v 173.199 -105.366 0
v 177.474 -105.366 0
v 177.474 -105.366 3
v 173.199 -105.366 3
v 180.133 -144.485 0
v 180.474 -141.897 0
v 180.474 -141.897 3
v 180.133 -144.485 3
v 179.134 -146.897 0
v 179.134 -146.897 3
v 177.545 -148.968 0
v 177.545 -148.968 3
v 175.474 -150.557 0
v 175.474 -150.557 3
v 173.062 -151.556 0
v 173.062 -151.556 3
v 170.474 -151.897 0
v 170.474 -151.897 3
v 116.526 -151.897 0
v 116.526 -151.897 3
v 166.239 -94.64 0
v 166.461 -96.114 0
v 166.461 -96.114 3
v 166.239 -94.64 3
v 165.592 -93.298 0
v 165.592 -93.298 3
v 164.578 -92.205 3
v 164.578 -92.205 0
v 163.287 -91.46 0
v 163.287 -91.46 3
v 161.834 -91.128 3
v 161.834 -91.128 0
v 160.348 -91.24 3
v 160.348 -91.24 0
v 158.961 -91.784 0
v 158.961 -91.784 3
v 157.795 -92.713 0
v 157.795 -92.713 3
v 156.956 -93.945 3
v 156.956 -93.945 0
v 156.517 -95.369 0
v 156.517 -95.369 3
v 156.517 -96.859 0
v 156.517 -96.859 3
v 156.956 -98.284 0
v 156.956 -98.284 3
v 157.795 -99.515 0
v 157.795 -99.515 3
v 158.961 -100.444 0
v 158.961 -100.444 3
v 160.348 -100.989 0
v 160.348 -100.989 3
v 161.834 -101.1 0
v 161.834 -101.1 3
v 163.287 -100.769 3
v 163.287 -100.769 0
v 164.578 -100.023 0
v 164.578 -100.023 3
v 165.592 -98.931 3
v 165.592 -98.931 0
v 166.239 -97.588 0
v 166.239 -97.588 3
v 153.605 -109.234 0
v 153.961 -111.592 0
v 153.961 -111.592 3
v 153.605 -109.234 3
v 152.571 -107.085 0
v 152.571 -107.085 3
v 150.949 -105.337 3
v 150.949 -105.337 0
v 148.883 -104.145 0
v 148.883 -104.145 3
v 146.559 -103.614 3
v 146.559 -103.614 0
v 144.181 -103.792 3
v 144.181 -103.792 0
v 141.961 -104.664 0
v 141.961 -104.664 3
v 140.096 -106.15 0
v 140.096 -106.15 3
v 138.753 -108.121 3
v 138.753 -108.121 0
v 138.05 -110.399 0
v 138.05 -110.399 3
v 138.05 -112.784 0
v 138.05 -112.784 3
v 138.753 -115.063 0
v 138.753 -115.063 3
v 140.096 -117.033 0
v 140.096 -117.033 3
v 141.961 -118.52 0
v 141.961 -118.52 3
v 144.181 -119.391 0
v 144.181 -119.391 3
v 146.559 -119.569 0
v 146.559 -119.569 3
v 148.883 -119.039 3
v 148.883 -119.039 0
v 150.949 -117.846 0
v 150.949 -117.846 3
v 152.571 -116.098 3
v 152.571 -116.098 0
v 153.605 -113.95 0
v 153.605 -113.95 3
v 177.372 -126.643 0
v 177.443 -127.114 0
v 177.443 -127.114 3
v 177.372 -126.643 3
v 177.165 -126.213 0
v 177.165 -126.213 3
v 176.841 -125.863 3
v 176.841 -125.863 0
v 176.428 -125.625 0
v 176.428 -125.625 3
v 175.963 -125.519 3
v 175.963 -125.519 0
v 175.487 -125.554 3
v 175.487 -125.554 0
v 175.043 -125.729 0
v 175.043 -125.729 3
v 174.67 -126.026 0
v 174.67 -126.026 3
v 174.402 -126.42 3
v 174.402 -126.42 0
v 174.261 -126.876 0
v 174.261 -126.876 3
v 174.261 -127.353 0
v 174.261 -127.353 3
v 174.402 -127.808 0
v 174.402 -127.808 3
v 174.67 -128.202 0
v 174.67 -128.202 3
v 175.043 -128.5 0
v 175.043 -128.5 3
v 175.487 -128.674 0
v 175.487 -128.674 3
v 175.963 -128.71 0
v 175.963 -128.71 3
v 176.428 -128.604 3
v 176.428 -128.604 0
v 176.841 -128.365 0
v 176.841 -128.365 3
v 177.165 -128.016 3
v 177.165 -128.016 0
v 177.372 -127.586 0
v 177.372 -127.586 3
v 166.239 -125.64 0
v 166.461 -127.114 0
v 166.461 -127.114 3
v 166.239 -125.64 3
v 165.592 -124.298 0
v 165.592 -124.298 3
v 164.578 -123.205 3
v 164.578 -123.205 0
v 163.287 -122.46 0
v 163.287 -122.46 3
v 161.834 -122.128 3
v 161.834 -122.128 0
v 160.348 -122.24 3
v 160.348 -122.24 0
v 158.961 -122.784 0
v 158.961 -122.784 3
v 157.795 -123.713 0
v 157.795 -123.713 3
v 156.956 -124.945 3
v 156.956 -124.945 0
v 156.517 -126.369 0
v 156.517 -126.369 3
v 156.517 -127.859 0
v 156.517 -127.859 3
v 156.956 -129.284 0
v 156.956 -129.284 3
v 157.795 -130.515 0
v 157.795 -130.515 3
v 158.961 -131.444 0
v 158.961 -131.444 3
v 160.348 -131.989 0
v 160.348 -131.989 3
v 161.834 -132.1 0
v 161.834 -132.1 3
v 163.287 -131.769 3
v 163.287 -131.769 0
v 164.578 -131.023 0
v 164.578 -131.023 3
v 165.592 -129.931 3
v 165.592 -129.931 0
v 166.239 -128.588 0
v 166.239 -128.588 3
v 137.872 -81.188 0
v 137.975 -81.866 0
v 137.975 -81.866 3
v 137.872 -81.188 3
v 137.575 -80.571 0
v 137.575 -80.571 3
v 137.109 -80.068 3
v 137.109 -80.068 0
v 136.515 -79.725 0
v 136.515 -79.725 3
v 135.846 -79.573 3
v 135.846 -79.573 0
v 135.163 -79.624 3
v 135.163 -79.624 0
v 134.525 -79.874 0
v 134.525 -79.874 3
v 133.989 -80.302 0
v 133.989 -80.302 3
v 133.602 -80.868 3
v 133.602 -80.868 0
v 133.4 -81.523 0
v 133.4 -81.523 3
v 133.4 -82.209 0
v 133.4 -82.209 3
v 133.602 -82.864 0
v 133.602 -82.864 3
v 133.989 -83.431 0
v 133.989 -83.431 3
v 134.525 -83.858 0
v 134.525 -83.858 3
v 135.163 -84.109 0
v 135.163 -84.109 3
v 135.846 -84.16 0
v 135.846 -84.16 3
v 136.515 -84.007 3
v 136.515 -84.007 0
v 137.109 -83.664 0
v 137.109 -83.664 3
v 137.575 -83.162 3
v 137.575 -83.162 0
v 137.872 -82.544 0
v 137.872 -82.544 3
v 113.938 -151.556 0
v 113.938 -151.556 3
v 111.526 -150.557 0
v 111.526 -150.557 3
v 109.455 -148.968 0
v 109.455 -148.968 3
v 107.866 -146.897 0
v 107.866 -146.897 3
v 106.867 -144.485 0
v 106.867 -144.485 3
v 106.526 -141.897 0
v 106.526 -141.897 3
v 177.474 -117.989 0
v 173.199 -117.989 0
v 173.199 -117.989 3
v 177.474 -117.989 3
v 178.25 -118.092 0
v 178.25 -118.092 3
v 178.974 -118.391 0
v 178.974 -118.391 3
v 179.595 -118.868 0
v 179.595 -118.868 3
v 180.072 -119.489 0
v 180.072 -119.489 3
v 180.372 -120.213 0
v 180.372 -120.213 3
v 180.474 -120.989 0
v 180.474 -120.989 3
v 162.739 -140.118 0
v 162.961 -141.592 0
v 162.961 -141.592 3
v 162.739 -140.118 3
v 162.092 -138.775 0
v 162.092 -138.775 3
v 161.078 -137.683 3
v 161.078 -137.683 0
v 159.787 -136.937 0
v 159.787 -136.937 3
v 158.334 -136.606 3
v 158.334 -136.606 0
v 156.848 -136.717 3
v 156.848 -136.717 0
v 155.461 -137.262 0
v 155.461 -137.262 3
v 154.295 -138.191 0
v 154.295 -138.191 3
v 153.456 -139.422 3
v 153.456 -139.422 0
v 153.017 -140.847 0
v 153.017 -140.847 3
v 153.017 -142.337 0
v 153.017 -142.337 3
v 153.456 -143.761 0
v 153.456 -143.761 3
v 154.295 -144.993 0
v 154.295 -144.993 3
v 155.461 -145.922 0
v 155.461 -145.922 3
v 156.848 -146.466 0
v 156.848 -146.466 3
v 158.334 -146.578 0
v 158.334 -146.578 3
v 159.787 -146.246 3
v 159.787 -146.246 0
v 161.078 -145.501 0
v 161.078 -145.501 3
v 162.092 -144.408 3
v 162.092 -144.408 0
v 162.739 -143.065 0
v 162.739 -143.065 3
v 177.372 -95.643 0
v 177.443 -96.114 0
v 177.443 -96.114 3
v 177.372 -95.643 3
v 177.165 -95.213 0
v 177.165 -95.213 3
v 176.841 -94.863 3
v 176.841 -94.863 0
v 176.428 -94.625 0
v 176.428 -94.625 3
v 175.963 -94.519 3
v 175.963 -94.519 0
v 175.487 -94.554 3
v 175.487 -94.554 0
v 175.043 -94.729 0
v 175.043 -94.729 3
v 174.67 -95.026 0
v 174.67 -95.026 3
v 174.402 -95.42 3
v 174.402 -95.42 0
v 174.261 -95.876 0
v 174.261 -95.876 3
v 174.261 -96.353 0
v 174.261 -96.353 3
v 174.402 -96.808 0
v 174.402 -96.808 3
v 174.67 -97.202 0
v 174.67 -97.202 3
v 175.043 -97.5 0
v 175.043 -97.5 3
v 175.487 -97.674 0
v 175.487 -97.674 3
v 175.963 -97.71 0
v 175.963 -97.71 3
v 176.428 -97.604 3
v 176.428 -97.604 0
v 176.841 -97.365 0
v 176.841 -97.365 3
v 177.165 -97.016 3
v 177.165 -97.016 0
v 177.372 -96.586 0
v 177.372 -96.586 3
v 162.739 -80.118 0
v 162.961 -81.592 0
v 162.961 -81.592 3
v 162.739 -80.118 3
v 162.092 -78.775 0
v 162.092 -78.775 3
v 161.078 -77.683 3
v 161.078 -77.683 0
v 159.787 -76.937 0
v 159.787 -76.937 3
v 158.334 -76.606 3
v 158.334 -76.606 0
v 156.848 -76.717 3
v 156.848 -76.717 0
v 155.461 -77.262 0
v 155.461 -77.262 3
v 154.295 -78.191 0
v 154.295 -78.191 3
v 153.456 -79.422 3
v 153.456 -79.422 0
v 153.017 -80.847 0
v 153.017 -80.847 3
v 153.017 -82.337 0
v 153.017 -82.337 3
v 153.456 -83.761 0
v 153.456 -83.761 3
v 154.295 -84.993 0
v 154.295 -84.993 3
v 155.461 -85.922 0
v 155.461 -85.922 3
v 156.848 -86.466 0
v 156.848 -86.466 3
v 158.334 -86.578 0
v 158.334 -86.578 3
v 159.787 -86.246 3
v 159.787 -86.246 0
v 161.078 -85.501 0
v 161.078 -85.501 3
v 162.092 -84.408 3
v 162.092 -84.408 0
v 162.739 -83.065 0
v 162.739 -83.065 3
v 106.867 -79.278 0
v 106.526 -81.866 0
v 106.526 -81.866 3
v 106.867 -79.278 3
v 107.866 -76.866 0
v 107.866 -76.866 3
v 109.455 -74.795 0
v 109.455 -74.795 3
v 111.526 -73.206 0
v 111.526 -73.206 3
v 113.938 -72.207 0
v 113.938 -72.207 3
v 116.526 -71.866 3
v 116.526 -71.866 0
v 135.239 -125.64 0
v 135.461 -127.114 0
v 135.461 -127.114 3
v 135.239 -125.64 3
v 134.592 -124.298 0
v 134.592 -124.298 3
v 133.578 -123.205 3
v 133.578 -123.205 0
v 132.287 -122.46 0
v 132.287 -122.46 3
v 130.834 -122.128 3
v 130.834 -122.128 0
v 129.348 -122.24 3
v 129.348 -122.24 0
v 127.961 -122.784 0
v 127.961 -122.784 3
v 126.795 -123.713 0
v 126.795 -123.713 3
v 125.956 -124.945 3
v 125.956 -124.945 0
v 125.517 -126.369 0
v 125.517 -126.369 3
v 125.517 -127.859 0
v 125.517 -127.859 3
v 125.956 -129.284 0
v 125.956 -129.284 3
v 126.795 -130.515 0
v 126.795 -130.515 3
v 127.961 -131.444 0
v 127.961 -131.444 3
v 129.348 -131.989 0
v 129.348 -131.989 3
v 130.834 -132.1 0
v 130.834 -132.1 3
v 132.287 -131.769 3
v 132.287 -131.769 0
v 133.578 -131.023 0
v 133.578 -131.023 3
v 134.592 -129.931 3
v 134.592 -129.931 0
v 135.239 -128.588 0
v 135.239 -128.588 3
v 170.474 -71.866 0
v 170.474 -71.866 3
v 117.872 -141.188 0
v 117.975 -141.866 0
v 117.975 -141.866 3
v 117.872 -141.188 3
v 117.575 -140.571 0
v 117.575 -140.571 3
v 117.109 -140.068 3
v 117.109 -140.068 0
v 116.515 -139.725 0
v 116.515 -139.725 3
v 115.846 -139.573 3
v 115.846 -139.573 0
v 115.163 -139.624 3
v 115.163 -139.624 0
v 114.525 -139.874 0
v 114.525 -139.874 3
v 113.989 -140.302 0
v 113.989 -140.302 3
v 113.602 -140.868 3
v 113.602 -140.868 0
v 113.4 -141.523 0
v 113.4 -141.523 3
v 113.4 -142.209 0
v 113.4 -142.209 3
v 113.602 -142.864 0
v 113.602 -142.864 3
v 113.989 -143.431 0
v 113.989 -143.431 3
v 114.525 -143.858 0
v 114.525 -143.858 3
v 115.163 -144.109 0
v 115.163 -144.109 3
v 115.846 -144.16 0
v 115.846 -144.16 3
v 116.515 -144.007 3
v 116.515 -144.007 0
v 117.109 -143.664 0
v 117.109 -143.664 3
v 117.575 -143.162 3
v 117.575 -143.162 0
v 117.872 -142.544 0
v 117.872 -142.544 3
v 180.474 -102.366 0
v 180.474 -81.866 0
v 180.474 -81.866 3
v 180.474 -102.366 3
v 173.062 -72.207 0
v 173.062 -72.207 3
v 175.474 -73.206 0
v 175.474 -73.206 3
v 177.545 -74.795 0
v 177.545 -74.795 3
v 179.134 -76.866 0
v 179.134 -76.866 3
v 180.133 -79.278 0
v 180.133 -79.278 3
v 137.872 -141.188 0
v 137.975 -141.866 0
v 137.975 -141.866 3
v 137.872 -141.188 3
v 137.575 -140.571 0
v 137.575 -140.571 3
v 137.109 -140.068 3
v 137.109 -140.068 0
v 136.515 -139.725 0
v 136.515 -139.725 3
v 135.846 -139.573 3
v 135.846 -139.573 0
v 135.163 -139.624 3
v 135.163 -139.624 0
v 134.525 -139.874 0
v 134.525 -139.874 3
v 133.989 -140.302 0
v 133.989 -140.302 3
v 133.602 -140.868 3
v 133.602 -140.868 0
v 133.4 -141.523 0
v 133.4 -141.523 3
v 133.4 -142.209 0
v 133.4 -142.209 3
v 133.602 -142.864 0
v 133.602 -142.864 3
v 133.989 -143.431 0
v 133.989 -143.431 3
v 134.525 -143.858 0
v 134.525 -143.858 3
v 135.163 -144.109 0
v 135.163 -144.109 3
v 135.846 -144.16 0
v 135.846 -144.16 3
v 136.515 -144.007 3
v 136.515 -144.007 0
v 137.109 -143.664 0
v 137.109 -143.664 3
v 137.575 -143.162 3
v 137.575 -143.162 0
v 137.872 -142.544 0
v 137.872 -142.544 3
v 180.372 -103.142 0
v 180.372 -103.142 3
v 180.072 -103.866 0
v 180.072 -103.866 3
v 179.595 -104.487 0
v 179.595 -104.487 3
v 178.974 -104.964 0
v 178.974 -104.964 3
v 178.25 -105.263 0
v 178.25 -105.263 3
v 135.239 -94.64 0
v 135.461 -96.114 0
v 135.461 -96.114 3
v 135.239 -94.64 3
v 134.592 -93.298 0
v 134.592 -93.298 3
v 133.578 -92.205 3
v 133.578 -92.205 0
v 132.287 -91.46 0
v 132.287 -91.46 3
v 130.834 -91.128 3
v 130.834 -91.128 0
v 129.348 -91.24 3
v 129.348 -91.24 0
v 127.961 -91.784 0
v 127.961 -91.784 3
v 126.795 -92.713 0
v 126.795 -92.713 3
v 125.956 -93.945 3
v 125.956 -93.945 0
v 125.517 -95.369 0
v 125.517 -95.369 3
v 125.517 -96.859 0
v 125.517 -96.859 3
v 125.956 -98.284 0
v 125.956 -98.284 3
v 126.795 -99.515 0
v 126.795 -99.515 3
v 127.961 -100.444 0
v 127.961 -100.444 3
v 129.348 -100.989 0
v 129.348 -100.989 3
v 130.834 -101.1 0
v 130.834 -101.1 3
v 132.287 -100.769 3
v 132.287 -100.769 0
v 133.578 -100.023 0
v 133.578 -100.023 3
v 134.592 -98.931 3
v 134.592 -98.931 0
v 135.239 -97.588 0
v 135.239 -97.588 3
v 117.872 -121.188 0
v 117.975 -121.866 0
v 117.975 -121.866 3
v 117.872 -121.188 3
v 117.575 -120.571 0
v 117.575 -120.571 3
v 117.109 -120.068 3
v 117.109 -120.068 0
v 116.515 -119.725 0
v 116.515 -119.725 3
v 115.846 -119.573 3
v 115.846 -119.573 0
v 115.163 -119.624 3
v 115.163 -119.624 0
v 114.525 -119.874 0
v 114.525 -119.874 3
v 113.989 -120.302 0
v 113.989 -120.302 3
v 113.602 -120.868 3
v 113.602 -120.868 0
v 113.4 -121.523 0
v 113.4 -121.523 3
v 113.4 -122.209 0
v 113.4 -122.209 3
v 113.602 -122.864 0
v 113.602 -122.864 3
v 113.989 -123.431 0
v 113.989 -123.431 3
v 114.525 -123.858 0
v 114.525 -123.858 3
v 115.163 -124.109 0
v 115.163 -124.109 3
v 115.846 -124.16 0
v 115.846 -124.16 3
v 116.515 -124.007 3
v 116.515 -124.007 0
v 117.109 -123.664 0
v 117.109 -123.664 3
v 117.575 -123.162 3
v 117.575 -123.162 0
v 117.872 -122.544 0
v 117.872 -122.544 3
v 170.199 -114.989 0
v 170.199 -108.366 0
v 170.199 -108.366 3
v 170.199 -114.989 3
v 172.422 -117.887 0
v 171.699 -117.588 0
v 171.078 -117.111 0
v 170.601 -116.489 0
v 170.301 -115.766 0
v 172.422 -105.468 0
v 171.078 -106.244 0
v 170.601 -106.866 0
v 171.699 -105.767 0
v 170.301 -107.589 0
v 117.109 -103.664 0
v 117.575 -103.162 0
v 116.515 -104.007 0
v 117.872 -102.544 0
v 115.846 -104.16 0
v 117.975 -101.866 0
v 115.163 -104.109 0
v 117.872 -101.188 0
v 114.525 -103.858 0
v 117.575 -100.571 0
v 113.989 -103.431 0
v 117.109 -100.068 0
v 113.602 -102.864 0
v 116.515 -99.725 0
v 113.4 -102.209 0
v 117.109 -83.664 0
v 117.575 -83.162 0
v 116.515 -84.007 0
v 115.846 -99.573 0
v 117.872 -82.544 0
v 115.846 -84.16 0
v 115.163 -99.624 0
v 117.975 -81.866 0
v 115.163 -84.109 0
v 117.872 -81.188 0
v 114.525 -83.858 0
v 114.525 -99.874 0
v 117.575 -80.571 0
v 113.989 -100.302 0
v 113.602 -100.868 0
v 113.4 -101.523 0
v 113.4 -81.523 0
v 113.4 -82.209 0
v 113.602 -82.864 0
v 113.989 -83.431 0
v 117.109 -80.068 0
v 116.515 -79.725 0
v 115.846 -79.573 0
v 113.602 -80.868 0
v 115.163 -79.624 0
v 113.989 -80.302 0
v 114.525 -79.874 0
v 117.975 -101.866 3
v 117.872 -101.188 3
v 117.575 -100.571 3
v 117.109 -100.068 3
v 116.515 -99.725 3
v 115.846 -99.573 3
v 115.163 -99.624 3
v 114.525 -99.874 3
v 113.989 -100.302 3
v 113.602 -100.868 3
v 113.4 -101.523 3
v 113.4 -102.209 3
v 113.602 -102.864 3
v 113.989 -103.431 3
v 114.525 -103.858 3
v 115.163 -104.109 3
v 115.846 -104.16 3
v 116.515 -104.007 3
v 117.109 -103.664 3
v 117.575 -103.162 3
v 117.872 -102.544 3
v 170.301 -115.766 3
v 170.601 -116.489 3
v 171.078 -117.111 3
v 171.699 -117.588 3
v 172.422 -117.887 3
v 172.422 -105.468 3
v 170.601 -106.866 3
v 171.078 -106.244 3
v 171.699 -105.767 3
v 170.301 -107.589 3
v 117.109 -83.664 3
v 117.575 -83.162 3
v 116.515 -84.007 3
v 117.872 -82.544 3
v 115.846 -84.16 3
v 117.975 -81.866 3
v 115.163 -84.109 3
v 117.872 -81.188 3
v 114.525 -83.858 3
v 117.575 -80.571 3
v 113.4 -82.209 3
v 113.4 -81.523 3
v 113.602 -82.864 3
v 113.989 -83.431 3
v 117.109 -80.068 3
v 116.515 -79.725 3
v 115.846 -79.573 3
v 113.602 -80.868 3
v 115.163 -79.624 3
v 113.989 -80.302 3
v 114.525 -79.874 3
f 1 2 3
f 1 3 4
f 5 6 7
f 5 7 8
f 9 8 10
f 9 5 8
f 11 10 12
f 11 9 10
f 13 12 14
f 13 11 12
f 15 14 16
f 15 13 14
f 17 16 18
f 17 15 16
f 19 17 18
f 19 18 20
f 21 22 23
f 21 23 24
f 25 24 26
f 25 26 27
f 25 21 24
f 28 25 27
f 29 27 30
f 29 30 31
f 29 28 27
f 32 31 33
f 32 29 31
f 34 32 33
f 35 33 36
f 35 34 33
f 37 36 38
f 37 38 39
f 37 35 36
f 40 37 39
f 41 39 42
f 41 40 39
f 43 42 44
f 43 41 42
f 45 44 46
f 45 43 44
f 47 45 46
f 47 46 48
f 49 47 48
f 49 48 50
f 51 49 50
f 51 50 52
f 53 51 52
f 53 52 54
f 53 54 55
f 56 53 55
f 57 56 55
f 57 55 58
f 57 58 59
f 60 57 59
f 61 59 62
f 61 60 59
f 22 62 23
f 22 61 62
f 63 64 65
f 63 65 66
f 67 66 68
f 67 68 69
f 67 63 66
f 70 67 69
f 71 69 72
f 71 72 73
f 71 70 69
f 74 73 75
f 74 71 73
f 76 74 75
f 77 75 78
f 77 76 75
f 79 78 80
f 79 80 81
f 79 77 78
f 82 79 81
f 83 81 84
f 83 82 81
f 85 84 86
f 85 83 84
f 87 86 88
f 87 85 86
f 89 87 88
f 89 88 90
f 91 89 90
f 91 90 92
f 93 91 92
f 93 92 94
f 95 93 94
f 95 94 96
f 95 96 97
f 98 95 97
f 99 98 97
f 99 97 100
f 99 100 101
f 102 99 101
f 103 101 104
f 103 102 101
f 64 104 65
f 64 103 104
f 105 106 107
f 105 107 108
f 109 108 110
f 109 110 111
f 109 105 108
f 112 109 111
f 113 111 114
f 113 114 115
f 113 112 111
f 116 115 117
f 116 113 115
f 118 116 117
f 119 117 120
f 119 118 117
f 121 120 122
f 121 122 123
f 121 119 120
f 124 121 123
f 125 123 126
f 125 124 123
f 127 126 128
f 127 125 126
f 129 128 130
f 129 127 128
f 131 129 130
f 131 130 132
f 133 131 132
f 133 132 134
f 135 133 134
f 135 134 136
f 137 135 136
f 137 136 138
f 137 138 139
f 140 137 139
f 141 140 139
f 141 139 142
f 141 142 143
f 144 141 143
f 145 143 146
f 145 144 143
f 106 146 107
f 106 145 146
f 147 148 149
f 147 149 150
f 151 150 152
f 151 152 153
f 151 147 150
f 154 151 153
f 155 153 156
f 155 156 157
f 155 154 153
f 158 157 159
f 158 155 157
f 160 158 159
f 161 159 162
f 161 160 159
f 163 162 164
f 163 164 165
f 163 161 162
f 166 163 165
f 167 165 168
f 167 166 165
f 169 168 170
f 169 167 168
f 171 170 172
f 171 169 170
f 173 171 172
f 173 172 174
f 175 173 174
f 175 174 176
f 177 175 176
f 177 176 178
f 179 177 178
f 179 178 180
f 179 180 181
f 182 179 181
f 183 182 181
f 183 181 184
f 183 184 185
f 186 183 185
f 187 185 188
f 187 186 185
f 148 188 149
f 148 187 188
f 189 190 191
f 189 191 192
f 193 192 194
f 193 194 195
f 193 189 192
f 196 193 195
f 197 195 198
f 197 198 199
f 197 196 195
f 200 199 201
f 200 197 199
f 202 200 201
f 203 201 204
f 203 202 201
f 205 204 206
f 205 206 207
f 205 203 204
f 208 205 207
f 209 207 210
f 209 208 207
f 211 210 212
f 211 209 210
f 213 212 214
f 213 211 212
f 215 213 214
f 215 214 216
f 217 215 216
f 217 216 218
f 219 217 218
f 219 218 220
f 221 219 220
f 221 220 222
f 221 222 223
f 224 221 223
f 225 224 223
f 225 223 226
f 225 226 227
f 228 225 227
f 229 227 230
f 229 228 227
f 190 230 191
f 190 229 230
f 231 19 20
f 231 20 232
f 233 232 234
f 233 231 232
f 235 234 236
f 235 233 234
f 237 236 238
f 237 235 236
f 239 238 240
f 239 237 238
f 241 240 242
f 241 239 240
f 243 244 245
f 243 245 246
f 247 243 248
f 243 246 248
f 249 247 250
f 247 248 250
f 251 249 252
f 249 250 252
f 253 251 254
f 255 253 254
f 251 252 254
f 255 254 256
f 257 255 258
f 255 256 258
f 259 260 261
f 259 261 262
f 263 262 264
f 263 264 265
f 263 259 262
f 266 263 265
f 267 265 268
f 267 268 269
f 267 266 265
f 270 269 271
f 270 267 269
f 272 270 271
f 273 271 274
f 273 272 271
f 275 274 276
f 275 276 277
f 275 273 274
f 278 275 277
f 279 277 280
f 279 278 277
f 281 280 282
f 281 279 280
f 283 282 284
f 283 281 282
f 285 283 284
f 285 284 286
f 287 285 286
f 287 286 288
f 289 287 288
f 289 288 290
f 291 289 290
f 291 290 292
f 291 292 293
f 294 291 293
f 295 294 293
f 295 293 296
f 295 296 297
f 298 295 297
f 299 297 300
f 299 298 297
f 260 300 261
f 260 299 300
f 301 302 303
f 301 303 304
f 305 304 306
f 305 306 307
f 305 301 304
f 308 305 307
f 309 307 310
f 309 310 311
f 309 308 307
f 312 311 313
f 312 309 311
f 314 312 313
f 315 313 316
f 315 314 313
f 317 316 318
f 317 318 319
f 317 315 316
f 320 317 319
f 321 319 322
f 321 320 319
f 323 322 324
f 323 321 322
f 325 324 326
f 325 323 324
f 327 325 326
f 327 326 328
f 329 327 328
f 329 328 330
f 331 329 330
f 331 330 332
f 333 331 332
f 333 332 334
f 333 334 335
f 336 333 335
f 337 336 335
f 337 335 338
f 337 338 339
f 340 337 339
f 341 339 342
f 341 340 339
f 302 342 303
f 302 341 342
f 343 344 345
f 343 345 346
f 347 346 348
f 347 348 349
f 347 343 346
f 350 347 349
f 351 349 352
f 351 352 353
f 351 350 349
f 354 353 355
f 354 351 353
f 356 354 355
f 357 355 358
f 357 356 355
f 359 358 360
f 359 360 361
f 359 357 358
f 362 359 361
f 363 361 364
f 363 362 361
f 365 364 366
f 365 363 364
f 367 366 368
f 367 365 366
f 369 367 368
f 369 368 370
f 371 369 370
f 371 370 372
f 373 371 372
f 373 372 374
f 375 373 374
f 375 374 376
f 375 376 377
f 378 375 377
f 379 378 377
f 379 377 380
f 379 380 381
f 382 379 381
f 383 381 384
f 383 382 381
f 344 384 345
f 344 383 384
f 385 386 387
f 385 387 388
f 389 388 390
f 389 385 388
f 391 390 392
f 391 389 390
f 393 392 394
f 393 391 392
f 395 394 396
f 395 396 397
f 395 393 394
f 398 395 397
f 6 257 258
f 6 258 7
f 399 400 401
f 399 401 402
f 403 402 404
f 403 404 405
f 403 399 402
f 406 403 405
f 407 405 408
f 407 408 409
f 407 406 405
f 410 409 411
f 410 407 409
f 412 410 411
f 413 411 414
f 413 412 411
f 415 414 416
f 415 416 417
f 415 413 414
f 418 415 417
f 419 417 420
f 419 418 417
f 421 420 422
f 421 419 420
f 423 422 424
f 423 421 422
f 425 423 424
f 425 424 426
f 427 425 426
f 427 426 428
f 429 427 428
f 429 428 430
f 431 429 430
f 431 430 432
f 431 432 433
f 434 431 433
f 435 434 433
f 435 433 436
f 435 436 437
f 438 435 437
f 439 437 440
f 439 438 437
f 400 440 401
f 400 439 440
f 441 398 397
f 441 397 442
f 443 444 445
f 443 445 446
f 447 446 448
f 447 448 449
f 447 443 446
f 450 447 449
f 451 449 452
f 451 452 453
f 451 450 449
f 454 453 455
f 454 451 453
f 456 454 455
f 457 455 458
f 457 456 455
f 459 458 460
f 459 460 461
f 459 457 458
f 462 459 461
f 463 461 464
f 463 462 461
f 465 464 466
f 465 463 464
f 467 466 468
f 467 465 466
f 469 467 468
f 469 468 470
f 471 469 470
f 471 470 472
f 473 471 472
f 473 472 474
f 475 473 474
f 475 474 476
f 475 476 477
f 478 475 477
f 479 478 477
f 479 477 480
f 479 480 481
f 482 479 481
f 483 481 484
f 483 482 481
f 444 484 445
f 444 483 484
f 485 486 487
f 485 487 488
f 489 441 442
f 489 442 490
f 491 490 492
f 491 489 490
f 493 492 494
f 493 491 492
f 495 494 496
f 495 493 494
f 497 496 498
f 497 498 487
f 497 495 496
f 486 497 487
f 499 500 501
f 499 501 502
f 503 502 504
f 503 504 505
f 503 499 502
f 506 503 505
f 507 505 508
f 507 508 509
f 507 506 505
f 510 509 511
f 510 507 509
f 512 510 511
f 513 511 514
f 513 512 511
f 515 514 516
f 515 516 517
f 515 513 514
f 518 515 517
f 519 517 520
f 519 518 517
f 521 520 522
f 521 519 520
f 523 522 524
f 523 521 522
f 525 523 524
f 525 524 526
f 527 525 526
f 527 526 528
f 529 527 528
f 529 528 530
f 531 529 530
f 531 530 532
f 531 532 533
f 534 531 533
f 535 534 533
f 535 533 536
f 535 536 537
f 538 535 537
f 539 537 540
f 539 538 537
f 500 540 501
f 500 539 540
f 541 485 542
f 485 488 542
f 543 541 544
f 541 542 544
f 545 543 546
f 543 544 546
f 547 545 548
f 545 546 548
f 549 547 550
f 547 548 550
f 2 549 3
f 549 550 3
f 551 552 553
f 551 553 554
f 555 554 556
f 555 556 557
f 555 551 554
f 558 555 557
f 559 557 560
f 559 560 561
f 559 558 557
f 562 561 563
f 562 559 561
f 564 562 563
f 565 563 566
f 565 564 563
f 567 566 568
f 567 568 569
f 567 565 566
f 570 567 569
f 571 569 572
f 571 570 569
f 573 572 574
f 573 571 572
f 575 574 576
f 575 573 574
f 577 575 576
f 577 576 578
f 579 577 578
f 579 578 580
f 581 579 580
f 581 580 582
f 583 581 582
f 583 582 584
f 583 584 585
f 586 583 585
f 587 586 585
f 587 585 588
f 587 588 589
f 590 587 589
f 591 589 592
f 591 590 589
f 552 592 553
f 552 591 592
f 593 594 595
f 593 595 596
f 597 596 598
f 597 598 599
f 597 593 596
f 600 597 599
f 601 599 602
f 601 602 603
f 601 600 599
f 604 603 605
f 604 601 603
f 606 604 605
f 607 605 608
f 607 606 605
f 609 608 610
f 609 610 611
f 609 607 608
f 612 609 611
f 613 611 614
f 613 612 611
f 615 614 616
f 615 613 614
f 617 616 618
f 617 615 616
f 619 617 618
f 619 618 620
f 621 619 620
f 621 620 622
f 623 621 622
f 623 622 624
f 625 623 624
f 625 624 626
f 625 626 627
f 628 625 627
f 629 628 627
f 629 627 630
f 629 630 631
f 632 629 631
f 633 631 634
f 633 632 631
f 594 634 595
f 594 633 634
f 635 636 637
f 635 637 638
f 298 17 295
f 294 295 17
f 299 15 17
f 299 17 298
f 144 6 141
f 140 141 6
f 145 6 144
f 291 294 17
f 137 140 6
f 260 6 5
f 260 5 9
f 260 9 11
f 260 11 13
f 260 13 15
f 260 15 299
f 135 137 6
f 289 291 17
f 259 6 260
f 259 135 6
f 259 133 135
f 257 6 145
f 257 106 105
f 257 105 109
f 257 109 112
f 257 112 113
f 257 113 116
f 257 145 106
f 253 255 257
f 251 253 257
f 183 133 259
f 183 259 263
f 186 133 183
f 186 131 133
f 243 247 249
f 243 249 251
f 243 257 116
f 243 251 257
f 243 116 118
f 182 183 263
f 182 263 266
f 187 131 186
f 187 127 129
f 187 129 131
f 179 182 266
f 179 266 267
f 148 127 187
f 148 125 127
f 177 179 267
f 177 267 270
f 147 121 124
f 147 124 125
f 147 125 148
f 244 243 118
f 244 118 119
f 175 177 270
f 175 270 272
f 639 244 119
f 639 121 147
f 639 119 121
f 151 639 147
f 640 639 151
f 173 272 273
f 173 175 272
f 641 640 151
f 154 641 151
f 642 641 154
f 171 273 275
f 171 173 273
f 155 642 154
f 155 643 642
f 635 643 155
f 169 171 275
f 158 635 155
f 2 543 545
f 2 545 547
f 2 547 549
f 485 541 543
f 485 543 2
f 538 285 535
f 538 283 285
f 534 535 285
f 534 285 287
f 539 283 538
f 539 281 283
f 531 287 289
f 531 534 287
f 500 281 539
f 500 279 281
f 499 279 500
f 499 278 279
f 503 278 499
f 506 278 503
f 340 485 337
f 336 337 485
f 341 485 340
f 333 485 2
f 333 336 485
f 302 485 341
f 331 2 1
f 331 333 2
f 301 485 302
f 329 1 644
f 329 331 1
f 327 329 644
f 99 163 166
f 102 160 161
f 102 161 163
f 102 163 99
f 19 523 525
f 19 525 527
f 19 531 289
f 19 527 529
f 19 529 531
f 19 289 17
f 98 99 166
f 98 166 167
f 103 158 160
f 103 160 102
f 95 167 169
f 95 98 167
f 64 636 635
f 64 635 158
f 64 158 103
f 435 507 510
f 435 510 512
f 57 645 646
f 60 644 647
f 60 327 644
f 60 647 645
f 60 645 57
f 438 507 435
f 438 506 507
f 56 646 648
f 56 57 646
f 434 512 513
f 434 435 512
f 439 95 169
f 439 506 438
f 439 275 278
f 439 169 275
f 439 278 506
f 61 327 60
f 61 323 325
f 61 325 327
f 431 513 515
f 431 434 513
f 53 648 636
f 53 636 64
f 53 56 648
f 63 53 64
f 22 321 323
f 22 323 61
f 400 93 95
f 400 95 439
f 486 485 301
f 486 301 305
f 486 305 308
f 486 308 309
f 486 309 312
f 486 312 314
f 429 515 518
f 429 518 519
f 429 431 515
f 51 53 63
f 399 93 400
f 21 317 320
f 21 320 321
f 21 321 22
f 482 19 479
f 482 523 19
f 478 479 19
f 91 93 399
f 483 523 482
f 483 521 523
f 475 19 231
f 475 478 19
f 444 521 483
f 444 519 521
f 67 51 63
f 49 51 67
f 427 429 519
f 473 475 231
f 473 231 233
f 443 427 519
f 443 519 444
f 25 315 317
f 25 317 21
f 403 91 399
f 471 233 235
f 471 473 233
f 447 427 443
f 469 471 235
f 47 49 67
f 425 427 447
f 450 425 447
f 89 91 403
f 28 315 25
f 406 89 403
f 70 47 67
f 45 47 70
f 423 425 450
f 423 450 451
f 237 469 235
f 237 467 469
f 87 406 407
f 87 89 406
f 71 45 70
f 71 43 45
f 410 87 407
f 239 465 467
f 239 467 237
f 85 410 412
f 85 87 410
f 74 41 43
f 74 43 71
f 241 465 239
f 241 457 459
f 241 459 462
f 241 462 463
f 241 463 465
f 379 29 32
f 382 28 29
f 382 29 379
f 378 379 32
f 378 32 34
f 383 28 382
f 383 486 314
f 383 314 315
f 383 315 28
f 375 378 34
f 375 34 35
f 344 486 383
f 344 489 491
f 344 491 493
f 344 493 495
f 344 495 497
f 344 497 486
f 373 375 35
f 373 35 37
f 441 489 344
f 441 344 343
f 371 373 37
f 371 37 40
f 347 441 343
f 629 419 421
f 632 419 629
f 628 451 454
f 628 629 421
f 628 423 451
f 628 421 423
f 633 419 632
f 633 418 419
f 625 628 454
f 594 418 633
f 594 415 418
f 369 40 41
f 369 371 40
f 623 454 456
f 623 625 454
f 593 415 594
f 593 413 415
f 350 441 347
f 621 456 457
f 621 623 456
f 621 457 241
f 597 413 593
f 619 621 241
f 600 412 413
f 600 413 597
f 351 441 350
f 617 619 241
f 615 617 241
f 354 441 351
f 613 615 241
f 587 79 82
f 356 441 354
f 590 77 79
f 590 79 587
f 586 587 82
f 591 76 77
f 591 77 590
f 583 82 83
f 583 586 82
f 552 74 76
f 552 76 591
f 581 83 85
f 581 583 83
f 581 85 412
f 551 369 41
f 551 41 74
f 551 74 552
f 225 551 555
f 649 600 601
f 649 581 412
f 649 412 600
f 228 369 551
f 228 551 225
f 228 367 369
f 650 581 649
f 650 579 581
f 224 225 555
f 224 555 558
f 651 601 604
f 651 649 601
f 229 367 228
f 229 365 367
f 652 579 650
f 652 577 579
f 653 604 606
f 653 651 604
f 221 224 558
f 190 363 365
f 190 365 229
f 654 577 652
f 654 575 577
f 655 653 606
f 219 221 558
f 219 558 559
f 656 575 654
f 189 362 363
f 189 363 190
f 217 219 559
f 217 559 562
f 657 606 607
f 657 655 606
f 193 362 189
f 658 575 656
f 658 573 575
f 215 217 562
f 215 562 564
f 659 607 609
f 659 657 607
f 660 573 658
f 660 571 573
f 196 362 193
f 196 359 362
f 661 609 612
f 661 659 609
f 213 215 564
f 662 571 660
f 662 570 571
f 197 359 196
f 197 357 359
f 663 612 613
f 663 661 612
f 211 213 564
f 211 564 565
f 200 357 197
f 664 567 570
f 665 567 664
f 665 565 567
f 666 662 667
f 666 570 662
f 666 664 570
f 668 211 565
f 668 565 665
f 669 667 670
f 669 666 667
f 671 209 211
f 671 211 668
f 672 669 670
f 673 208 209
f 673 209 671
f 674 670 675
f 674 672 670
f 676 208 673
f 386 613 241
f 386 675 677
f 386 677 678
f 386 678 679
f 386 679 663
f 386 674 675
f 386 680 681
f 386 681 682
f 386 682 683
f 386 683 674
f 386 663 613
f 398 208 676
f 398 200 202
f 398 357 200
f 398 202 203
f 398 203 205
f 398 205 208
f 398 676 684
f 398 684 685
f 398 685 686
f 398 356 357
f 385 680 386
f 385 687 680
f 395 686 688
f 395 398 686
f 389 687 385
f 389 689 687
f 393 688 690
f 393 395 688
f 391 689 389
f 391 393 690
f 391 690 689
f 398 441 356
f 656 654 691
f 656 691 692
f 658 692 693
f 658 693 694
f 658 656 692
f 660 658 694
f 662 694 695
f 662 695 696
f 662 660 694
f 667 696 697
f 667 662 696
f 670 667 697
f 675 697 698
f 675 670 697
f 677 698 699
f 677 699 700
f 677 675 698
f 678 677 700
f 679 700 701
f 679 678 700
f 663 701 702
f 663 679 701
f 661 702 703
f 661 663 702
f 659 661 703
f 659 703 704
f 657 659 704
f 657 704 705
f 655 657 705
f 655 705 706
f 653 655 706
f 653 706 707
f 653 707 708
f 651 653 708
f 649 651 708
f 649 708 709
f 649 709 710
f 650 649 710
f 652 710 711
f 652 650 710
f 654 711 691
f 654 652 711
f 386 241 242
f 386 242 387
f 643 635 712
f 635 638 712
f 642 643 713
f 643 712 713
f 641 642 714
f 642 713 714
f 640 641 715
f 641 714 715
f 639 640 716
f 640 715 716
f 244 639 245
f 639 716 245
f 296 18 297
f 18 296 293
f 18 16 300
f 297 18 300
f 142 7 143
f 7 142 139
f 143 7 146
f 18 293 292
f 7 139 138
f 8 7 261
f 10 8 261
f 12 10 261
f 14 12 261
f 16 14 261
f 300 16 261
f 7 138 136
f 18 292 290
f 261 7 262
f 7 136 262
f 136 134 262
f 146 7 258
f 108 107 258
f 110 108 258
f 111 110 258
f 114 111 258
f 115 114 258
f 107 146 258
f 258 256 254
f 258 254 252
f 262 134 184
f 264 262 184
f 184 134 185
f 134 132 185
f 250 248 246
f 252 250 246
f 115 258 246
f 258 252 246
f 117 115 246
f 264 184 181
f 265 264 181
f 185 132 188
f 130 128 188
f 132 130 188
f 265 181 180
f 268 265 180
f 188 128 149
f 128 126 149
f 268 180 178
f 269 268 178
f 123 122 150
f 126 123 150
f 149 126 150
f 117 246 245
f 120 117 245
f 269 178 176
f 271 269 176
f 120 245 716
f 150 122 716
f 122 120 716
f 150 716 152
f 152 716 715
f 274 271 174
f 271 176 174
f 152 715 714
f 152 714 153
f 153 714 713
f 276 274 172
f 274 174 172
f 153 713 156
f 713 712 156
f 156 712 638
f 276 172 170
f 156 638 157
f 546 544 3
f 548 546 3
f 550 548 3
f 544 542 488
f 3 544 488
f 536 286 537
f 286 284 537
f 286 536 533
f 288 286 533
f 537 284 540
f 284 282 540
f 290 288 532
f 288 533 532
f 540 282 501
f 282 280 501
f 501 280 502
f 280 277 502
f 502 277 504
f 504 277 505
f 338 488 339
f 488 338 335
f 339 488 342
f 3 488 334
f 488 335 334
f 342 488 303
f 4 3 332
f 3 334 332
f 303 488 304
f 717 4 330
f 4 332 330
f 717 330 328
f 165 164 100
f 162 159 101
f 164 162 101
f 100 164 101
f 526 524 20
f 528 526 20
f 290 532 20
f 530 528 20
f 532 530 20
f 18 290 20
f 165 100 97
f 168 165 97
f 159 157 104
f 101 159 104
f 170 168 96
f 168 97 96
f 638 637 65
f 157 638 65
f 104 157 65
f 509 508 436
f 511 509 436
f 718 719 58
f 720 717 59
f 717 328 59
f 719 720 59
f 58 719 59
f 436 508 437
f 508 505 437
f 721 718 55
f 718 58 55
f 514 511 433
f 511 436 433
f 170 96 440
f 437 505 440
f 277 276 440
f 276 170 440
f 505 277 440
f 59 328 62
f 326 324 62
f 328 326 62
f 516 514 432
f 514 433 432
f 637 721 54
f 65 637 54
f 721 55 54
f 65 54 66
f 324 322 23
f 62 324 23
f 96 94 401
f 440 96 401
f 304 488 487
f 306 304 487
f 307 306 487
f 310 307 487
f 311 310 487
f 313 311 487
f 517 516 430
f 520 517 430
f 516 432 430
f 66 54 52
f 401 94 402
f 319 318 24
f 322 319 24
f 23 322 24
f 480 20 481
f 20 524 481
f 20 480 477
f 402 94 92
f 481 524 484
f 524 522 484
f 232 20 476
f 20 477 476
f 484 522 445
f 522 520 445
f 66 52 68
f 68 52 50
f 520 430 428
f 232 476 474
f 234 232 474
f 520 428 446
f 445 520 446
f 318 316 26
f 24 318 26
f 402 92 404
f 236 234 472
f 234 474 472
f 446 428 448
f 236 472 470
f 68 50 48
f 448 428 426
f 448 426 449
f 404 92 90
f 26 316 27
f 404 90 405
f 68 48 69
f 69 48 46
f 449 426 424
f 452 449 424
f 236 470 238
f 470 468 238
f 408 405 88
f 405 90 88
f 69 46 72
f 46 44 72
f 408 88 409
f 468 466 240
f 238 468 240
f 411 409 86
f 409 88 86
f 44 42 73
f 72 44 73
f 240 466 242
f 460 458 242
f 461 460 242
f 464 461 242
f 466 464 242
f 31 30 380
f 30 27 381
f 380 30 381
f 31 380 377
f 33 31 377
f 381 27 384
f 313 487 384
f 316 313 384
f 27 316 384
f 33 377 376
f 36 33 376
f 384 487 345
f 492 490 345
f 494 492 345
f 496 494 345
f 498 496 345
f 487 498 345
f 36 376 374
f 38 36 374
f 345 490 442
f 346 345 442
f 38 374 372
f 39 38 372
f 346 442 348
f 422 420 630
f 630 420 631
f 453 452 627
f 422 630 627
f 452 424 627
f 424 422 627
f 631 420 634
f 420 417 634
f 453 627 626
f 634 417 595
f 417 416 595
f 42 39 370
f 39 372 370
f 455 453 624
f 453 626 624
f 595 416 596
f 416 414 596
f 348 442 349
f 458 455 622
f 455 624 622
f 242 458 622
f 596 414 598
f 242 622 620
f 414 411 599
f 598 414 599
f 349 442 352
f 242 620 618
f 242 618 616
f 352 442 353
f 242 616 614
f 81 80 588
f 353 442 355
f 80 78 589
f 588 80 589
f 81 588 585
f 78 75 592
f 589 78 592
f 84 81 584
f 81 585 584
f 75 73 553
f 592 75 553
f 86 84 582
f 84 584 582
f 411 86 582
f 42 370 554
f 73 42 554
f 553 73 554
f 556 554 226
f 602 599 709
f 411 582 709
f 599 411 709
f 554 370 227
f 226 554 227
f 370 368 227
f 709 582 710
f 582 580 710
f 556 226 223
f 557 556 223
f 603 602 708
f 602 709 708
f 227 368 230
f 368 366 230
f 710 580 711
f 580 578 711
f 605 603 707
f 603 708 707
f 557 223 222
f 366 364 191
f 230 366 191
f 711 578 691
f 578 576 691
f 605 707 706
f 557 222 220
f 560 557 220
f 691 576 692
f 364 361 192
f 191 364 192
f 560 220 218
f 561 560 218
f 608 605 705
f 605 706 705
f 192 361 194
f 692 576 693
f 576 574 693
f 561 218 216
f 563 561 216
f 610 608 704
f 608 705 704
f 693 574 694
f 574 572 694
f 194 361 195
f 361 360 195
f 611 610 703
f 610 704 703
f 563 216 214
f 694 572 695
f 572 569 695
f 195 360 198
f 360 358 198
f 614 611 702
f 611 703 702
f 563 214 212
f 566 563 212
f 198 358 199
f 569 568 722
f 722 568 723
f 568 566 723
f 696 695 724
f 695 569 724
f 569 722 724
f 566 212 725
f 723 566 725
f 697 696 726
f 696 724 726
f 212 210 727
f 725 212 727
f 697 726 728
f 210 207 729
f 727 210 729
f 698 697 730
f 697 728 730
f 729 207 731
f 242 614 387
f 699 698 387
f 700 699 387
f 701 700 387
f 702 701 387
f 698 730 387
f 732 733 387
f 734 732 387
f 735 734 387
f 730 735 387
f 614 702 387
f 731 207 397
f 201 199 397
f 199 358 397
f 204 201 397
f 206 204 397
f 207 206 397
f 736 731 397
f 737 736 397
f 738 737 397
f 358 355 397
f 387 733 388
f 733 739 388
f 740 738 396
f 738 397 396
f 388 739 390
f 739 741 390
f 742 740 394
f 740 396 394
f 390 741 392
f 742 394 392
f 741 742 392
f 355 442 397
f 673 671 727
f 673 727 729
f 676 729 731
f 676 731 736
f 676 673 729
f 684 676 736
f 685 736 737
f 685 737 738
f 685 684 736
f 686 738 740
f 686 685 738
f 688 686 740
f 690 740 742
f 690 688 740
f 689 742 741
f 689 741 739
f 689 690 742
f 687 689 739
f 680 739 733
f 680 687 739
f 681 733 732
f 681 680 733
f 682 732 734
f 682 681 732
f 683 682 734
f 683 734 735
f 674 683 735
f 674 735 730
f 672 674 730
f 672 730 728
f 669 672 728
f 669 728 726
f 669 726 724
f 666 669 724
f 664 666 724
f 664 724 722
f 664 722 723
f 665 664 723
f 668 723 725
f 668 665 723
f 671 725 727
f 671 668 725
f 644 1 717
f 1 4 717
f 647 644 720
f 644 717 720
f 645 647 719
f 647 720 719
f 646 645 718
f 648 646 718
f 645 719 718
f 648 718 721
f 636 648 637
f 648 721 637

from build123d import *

# Parameters (mm, degrees)
SKETCH1_R           = 2.3
SKETCH1_R_2         = 5
SKETCH1_R_3         = 8
SKETCH1_R_4         = 1.6
BOSS_EXTRUDE1_DEPTH = 3
FILLET1_R           = 3


with BuildPart() as part:
    # Sketch1 → Boss-Extrude1 (new body)
    with BuildSketch(Plane.XY):
        with BuildLine():
            Line((157.960700719, -71.866196008), (170.473892307, -71.866196008))
            ThreePointArc((170.473892307, -71.866196008), (177.544960119, -74.795128196), (180.473892307, -81.866196008))
            Line((180.473892307, -81.866196008), (180.473892307, -102.365535019))
            Line((180.473892307, -102.365535019), (180.473892307, -105.365535019))
            Line((180.473892307, -105.365535019), (170.198907285, -105.365535019))
            Line((170.198907285, -105.365535019), (170.198907285, -117.989469864))
            Line((170.198907285, -117.989469864), (180.473892307, -117.989469864))
            Line((180.473892307, -117.989469864), (180.473892307, -120.989469864))
            Line((180.473892307, -120.989469864), (180.473892307, -141.896756479))
            ThreePointArc((180.473892307, -141.896756479), (177.544960119, -148.967824291), (170.473892307, -151.896756479))
            Line((170.473892307, -151.896756479), (157.960700719, -151.896756479))
            Line((157.960700719, -151.896756479), (116.525823666, -151.896756479))
            ThreePointArc((116.525823666, -151.896756479), (109.454755854, -148.967824291), (106.525823666, -141.896756479))
            Line((106.525823666, -141.896756479), (106.525823666, -81.866196008))
            ThreePointArc((106.525823666, -81.866196008), (109.454755854, -74.795128196), (116.525823666, -71.866196008))
            Line((116.525823666, -71.866196008), (157.960700719, -71.866196008))
        make_face()
        with Locations((115.674612816, -101.866196008)):
            Circle(SKETCH1_R, mode=Mode.SUBTRACT)
        with Locations((115.674612816, -121.866196008)):
            Circle(SKETCH1_R, mode=Mode.SUBTRACT)
        with Locations((135.674612816, -141.866196008)):
            Circle(SKETCH1_R, mode=Mode.SUBTRACT)
        with Locations((135.674612816, -81.866196008)):
            Circle(SKETCH1_R, mode=Mode.SUBTRACT)
        with Locations((115.674612816, -81.866196008)):
            Circle(SKETCH1_R, mode=Mode.SUBTRACT)
        with Locations((115.674612816, -141.866196008)):
            Circle(SKETCH1_R, mode=Mode.SUBTRACT)
        with Locations((161.460700719, -96.114221831)):
            Circle(SKETCH1_R_2, mode=Mode.SUBTRACT)
        with Locations((161.460700719, -127.114221831)):
            Circle(SKETCH1_R_2, mode=Mode.SUBTRACT)
        with Locations((130.460700719, -96.114221831)):
            Circle(SKETCH1_R_2, mode=Mode.SUBTRACT)
        with Locations((145.960700719, -111.591712302)):
            Circle(SKETCH1_R_3, mode=Mode.SUBTRACT)
        with Locations((175.843347401, -96.114221831)):
            Circle(SKETCH1_R_4, mode=Mode.SUBTRACT)
        with Locations((157.960700719, -81.591712302)):
            Circle(SKETCH1_R_2, mode=Mode.SUBTRACT)
        with Locations((157.960700719, -141.591712302)):
            Circle(SKETCH1_R_2, mode=Mode.SUBTRACT)
        with Locations((175.843347401, -127.114221831)):
            Circle(SKETCH1_R_4, mode=Mode.SUBTRACT)
        with Locations((130.460700719, -127.114221831)):
            Circle(SKETCH1_R_2, mode=Mode.SUBTRACT)
    extrude(amount=BOSS_EXTRUDE1_DEPTH)

    # Fillet1
    fillet1_edges = [part.edges().sort_by_distance(p)[0] for p in [
        (180.473892307, -105.365535019, 1.5),
        (170.198907285, -105.365535019, 1.5),
        (170.198907285, -117.989469864, 1.5),
        (180.473892307, -117.989469864, 1.5),
    ]]
    fillet(fillet1_edges, radius=FILLET1_R)


solid = part.part
